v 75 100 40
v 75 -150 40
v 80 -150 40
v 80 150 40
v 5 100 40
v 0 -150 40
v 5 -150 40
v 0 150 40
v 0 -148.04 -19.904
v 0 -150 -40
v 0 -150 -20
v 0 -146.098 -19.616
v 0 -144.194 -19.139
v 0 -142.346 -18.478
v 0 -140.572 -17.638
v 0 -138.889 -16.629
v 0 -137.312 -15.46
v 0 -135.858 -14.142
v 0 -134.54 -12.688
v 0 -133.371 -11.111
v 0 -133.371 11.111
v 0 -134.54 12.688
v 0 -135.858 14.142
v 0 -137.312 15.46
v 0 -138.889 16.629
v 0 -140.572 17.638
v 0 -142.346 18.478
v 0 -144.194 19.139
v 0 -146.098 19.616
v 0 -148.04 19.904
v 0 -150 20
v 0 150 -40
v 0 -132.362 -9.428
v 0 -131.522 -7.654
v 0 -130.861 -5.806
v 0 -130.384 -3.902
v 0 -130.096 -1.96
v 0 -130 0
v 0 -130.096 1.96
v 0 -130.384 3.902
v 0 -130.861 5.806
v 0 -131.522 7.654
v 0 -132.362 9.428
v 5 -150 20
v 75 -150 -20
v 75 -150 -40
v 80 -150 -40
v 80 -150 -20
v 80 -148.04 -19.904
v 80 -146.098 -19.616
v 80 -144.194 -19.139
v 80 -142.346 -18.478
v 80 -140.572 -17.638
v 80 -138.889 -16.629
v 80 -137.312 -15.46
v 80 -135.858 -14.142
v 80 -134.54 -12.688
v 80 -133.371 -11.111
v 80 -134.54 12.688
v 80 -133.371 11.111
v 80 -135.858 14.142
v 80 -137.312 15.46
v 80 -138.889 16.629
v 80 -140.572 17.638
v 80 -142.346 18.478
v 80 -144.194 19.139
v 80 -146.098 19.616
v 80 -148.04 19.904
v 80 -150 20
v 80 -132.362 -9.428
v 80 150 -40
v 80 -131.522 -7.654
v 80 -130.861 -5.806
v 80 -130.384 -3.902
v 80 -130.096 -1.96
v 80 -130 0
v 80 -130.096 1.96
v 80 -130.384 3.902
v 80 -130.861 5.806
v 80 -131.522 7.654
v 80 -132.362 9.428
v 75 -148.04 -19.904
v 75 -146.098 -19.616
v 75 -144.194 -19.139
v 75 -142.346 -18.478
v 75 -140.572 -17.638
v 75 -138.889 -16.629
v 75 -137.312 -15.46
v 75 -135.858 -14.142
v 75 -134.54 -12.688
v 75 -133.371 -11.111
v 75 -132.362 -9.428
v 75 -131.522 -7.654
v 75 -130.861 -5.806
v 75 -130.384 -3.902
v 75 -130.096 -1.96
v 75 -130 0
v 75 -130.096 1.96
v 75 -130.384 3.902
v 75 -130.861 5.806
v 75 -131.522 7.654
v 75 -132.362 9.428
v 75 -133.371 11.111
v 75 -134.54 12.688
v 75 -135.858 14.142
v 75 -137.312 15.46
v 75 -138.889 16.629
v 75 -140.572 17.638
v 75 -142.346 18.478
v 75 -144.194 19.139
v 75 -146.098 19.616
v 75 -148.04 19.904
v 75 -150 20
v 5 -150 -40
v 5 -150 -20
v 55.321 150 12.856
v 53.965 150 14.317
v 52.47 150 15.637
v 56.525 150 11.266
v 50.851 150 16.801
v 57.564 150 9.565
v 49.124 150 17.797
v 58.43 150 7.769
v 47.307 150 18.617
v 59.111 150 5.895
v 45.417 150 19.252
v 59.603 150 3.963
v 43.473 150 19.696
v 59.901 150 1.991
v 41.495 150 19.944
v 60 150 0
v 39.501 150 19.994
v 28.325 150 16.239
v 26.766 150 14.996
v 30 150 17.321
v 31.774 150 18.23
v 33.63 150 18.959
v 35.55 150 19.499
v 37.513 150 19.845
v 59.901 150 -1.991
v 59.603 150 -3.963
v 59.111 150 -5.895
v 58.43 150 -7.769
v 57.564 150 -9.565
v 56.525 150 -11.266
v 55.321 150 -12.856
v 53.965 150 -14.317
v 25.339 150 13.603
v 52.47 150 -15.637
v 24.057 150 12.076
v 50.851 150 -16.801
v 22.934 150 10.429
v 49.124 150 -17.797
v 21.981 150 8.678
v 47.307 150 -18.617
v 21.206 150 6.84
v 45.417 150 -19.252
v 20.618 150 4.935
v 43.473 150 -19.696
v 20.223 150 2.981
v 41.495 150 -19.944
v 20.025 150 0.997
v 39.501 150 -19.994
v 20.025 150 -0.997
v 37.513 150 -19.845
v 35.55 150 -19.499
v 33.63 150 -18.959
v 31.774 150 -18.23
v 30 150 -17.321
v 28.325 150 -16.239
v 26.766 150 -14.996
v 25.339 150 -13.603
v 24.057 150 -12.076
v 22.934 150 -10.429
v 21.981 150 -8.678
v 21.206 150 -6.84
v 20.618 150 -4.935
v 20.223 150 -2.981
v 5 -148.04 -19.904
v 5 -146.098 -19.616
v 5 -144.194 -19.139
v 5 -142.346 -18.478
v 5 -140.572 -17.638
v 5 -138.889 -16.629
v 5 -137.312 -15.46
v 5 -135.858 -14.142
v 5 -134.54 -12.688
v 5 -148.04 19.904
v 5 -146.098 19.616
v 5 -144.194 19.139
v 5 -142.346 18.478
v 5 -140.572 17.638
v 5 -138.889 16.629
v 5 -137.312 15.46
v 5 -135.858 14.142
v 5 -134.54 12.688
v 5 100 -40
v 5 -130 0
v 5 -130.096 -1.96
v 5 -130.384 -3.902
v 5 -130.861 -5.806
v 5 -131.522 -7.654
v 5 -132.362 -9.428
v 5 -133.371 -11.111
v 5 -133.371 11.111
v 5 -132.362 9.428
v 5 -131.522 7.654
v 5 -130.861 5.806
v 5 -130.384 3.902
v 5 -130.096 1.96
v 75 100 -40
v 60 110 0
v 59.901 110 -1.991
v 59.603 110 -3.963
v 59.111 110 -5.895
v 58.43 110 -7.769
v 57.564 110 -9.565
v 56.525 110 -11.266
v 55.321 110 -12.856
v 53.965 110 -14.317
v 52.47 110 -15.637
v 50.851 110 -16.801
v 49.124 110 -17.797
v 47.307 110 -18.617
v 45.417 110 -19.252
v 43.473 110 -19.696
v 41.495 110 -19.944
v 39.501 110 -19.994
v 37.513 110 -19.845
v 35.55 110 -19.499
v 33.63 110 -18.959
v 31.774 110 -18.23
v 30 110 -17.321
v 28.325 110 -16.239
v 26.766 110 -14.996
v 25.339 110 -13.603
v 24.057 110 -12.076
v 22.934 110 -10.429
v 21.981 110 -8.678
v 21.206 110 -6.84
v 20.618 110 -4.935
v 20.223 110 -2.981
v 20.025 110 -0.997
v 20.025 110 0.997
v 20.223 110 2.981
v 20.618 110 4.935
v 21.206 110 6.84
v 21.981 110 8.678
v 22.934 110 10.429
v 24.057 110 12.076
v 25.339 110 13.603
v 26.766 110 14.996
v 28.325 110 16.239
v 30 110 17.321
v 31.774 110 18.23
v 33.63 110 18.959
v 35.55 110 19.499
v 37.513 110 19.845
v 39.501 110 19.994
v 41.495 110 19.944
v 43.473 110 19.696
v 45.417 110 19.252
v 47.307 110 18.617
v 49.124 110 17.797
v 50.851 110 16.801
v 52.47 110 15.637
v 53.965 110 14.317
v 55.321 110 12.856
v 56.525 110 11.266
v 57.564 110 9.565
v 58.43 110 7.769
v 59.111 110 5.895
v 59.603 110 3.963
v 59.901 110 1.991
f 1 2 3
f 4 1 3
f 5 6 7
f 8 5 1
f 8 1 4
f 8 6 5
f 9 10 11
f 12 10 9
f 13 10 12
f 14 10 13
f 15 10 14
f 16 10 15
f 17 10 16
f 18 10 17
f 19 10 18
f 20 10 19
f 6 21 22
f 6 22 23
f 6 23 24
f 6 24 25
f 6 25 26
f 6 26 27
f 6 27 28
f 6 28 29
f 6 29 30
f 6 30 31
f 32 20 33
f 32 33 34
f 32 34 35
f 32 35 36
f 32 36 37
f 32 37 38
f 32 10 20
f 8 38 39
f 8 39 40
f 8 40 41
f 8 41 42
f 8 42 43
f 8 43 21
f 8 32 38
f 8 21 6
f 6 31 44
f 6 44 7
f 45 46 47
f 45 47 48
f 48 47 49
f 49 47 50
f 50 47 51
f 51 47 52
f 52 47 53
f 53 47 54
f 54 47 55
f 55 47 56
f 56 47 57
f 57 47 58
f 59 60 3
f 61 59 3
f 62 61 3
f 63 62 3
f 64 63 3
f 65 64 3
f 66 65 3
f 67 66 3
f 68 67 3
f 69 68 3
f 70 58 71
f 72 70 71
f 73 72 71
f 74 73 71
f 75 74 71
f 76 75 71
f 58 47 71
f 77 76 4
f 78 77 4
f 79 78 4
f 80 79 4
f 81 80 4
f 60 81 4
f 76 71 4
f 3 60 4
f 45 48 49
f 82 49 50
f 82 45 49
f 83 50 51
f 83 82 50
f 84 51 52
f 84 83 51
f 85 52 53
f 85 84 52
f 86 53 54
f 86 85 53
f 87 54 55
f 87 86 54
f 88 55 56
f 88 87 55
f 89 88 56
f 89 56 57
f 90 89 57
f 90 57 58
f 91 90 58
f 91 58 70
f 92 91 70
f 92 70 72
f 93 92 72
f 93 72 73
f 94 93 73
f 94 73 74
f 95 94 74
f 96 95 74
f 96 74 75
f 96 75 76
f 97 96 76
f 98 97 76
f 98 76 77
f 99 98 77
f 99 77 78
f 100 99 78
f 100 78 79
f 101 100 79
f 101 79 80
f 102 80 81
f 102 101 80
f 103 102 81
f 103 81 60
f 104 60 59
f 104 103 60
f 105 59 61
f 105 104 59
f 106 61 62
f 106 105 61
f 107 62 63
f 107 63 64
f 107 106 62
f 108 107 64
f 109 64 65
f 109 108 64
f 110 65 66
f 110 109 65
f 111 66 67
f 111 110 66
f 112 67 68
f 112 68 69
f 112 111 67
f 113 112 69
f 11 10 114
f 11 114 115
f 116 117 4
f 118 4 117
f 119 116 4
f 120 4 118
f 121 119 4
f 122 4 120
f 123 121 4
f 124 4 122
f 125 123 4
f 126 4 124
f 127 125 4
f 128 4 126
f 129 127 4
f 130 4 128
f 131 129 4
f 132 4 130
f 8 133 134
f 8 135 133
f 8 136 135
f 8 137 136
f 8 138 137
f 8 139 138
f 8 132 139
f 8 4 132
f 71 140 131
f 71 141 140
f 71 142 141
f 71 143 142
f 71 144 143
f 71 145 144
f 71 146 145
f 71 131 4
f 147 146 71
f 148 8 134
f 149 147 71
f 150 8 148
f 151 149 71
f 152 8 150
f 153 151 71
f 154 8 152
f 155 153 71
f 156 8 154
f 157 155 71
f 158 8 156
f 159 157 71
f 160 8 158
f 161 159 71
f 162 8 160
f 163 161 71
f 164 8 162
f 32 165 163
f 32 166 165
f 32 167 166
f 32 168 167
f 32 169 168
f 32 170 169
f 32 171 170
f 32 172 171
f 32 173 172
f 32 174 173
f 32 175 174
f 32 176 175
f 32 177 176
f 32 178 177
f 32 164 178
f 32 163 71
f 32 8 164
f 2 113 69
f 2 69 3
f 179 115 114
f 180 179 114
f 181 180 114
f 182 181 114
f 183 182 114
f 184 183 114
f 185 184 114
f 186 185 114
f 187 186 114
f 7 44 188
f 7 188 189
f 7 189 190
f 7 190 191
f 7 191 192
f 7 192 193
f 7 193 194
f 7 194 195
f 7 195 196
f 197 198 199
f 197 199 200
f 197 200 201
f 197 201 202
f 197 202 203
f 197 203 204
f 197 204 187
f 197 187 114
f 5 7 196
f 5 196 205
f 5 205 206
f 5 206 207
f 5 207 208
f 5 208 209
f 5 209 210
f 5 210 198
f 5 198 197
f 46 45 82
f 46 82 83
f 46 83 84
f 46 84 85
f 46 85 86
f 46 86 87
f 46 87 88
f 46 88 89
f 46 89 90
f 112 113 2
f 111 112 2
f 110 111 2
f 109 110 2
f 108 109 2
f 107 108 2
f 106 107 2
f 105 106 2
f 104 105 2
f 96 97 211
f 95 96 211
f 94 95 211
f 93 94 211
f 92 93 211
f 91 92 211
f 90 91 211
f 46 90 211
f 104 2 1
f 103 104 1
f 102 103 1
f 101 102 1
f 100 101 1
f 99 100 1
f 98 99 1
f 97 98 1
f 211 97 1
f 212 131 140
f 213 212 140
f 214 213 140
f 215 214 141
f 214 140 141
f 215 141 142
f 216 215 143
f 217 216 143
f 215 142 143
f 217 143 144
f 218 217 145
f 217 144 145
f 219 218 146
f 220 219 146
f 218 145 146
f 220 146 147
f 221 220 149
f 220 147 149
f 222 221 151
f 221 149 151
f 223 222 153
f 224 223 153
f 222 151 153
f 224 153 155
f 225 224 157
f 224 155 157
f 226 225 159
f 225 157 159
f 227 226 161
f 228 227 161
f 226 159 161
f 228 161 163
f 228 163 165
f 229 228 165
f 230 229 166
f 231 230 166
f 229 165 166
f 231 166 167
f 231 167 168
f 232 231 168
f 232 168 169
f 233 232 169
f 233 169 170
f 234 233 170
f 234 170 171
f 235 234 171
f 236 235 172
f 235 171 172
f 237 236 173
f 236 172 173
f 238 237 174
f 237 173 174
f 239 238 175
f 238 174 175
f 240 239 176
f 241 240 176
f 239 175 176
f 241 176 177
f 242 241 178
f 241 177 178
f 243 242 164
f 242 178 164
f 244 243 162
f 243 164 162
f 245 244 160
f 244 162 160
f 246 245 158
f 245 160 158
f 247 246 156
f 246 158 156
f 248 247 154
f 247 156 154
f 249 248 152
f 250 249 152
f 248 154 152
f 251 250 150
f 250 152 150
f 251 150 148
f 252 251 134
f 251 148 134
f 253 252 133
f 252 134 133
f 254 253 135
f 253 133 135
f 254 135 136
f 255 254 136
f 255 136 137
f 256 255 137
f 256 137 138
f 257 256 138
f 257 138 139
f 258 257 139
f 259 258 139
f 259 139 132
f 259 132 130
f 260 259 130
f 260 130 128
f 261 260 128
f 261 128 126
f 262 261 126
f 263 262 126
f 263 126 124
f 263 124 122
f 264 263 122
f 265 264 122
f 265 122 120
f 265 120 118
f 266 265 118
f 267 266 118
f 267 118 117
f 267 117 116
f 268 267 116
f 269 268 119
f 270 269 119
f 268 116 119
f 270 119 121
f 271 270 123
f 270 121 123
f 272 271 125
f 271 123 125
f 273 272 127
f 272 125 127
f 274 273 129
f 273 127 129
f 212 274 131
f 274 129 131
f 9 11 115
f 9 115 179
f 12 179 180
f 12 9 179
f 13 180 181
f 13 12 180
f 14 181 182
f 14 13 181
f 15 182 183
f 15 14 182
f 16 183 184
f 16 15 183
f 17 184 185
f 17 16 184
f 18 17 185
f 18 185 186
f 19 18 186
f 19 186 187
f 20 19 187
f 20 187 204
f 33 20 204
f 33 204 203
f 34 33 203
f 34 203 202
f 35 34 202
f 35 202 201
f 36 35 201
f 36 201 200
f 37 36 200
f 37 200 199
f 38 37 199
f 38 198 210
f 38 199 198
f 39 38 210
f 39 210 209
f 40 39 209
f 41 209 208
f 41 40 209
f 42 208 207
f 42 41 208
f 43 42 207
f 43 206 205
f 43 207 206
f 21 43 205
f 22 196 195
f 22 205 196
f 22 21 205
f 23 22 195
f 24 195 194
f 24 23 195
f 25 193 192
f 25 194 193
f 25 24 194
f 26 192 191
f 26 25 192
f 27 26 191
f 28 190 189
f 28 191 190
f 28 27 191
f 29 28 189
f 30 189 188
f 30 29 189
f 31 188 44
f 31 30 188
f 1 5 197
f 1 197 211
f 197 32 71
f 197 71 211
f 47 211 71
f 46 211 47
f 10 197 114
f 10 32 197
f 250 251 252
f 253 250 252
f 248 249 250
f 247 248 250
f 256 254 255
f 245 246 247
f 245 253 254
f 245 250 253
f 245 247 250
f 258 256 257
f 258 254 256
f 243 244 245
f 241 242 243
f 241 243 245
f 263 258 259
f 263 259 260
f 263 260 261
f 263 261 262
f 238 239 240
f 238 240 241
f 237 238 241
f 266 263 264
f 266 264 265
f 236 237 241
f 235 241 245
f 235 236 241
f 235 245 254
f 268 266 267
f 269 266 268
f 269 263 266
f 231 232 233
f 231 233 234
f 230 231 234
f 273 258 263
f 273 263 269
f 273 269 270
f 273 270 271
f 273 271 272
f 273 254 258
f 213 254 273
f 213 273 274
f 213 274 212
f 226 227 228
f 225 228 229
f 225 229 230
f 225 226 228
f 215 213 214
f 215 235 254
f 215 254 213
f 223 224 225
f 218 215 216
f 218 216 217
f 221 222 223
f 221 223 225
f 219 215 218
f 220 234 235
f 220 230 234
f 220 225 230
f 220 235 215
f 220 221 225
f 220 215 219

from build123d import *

# Parameters (mm, degrees)
BOSS_EXTRUDE2_DEPTH = 80
SKETCH4_W           = 70
SKETCH4_H           = 250
CUT_EXTRUDE1_DEPTH  = 81
SKETCH5_R           = 20
CUT_EXTRUDE2_DEPTH  = 40


with BuildPart() as part:
    # Sketch1 → Boss-Extrude2 (new body)
    with BuildSketch(Plane(origin=(0, 0, 0), x_dir=(0, 0, -1), z_dir=(1, 0, 0))):
        with BuildLine():
            Line((-20, -150), (-40, -150))
            Line((-40, -150), (-40, 150))
            Line((-40, 150), (40, 150))
            Line((40, 150), (40, -150))
            Line((40, -150), (20, -150))
            ThreePointArc((20, -150), (0, -130), (-20, -150))
        make_face()
    extrude(amount=BOSS_EXTRUDE2_DEPTH)

    # Sketch4 → Cut-Extrude1 (cut, through all)
    with BuildSketch(Plane.XY.offset(40)):
        with Locations((40, -25)):
            Rectangle(SKETCH4_W, SKETCH4_H)
    extrude(amount=-CUT_EXTRUDE1_DEPTH, mode=Mode.SUBTRACT)

    # Sketch5 → Cut-Extrude2 (cut)
    with BuildSketch(Plane(origin=(0, 150, 0), x_dir=(1, 0, 0), z_dir=(0, 1, 0))):
        with Locations((40, 0)):
            Circle(SKETCH5_R)
    extrude(amount=-CUT_EXTRUDE2_DEPTH, mode=Mode.SUBTRACT)


solid = part.part
